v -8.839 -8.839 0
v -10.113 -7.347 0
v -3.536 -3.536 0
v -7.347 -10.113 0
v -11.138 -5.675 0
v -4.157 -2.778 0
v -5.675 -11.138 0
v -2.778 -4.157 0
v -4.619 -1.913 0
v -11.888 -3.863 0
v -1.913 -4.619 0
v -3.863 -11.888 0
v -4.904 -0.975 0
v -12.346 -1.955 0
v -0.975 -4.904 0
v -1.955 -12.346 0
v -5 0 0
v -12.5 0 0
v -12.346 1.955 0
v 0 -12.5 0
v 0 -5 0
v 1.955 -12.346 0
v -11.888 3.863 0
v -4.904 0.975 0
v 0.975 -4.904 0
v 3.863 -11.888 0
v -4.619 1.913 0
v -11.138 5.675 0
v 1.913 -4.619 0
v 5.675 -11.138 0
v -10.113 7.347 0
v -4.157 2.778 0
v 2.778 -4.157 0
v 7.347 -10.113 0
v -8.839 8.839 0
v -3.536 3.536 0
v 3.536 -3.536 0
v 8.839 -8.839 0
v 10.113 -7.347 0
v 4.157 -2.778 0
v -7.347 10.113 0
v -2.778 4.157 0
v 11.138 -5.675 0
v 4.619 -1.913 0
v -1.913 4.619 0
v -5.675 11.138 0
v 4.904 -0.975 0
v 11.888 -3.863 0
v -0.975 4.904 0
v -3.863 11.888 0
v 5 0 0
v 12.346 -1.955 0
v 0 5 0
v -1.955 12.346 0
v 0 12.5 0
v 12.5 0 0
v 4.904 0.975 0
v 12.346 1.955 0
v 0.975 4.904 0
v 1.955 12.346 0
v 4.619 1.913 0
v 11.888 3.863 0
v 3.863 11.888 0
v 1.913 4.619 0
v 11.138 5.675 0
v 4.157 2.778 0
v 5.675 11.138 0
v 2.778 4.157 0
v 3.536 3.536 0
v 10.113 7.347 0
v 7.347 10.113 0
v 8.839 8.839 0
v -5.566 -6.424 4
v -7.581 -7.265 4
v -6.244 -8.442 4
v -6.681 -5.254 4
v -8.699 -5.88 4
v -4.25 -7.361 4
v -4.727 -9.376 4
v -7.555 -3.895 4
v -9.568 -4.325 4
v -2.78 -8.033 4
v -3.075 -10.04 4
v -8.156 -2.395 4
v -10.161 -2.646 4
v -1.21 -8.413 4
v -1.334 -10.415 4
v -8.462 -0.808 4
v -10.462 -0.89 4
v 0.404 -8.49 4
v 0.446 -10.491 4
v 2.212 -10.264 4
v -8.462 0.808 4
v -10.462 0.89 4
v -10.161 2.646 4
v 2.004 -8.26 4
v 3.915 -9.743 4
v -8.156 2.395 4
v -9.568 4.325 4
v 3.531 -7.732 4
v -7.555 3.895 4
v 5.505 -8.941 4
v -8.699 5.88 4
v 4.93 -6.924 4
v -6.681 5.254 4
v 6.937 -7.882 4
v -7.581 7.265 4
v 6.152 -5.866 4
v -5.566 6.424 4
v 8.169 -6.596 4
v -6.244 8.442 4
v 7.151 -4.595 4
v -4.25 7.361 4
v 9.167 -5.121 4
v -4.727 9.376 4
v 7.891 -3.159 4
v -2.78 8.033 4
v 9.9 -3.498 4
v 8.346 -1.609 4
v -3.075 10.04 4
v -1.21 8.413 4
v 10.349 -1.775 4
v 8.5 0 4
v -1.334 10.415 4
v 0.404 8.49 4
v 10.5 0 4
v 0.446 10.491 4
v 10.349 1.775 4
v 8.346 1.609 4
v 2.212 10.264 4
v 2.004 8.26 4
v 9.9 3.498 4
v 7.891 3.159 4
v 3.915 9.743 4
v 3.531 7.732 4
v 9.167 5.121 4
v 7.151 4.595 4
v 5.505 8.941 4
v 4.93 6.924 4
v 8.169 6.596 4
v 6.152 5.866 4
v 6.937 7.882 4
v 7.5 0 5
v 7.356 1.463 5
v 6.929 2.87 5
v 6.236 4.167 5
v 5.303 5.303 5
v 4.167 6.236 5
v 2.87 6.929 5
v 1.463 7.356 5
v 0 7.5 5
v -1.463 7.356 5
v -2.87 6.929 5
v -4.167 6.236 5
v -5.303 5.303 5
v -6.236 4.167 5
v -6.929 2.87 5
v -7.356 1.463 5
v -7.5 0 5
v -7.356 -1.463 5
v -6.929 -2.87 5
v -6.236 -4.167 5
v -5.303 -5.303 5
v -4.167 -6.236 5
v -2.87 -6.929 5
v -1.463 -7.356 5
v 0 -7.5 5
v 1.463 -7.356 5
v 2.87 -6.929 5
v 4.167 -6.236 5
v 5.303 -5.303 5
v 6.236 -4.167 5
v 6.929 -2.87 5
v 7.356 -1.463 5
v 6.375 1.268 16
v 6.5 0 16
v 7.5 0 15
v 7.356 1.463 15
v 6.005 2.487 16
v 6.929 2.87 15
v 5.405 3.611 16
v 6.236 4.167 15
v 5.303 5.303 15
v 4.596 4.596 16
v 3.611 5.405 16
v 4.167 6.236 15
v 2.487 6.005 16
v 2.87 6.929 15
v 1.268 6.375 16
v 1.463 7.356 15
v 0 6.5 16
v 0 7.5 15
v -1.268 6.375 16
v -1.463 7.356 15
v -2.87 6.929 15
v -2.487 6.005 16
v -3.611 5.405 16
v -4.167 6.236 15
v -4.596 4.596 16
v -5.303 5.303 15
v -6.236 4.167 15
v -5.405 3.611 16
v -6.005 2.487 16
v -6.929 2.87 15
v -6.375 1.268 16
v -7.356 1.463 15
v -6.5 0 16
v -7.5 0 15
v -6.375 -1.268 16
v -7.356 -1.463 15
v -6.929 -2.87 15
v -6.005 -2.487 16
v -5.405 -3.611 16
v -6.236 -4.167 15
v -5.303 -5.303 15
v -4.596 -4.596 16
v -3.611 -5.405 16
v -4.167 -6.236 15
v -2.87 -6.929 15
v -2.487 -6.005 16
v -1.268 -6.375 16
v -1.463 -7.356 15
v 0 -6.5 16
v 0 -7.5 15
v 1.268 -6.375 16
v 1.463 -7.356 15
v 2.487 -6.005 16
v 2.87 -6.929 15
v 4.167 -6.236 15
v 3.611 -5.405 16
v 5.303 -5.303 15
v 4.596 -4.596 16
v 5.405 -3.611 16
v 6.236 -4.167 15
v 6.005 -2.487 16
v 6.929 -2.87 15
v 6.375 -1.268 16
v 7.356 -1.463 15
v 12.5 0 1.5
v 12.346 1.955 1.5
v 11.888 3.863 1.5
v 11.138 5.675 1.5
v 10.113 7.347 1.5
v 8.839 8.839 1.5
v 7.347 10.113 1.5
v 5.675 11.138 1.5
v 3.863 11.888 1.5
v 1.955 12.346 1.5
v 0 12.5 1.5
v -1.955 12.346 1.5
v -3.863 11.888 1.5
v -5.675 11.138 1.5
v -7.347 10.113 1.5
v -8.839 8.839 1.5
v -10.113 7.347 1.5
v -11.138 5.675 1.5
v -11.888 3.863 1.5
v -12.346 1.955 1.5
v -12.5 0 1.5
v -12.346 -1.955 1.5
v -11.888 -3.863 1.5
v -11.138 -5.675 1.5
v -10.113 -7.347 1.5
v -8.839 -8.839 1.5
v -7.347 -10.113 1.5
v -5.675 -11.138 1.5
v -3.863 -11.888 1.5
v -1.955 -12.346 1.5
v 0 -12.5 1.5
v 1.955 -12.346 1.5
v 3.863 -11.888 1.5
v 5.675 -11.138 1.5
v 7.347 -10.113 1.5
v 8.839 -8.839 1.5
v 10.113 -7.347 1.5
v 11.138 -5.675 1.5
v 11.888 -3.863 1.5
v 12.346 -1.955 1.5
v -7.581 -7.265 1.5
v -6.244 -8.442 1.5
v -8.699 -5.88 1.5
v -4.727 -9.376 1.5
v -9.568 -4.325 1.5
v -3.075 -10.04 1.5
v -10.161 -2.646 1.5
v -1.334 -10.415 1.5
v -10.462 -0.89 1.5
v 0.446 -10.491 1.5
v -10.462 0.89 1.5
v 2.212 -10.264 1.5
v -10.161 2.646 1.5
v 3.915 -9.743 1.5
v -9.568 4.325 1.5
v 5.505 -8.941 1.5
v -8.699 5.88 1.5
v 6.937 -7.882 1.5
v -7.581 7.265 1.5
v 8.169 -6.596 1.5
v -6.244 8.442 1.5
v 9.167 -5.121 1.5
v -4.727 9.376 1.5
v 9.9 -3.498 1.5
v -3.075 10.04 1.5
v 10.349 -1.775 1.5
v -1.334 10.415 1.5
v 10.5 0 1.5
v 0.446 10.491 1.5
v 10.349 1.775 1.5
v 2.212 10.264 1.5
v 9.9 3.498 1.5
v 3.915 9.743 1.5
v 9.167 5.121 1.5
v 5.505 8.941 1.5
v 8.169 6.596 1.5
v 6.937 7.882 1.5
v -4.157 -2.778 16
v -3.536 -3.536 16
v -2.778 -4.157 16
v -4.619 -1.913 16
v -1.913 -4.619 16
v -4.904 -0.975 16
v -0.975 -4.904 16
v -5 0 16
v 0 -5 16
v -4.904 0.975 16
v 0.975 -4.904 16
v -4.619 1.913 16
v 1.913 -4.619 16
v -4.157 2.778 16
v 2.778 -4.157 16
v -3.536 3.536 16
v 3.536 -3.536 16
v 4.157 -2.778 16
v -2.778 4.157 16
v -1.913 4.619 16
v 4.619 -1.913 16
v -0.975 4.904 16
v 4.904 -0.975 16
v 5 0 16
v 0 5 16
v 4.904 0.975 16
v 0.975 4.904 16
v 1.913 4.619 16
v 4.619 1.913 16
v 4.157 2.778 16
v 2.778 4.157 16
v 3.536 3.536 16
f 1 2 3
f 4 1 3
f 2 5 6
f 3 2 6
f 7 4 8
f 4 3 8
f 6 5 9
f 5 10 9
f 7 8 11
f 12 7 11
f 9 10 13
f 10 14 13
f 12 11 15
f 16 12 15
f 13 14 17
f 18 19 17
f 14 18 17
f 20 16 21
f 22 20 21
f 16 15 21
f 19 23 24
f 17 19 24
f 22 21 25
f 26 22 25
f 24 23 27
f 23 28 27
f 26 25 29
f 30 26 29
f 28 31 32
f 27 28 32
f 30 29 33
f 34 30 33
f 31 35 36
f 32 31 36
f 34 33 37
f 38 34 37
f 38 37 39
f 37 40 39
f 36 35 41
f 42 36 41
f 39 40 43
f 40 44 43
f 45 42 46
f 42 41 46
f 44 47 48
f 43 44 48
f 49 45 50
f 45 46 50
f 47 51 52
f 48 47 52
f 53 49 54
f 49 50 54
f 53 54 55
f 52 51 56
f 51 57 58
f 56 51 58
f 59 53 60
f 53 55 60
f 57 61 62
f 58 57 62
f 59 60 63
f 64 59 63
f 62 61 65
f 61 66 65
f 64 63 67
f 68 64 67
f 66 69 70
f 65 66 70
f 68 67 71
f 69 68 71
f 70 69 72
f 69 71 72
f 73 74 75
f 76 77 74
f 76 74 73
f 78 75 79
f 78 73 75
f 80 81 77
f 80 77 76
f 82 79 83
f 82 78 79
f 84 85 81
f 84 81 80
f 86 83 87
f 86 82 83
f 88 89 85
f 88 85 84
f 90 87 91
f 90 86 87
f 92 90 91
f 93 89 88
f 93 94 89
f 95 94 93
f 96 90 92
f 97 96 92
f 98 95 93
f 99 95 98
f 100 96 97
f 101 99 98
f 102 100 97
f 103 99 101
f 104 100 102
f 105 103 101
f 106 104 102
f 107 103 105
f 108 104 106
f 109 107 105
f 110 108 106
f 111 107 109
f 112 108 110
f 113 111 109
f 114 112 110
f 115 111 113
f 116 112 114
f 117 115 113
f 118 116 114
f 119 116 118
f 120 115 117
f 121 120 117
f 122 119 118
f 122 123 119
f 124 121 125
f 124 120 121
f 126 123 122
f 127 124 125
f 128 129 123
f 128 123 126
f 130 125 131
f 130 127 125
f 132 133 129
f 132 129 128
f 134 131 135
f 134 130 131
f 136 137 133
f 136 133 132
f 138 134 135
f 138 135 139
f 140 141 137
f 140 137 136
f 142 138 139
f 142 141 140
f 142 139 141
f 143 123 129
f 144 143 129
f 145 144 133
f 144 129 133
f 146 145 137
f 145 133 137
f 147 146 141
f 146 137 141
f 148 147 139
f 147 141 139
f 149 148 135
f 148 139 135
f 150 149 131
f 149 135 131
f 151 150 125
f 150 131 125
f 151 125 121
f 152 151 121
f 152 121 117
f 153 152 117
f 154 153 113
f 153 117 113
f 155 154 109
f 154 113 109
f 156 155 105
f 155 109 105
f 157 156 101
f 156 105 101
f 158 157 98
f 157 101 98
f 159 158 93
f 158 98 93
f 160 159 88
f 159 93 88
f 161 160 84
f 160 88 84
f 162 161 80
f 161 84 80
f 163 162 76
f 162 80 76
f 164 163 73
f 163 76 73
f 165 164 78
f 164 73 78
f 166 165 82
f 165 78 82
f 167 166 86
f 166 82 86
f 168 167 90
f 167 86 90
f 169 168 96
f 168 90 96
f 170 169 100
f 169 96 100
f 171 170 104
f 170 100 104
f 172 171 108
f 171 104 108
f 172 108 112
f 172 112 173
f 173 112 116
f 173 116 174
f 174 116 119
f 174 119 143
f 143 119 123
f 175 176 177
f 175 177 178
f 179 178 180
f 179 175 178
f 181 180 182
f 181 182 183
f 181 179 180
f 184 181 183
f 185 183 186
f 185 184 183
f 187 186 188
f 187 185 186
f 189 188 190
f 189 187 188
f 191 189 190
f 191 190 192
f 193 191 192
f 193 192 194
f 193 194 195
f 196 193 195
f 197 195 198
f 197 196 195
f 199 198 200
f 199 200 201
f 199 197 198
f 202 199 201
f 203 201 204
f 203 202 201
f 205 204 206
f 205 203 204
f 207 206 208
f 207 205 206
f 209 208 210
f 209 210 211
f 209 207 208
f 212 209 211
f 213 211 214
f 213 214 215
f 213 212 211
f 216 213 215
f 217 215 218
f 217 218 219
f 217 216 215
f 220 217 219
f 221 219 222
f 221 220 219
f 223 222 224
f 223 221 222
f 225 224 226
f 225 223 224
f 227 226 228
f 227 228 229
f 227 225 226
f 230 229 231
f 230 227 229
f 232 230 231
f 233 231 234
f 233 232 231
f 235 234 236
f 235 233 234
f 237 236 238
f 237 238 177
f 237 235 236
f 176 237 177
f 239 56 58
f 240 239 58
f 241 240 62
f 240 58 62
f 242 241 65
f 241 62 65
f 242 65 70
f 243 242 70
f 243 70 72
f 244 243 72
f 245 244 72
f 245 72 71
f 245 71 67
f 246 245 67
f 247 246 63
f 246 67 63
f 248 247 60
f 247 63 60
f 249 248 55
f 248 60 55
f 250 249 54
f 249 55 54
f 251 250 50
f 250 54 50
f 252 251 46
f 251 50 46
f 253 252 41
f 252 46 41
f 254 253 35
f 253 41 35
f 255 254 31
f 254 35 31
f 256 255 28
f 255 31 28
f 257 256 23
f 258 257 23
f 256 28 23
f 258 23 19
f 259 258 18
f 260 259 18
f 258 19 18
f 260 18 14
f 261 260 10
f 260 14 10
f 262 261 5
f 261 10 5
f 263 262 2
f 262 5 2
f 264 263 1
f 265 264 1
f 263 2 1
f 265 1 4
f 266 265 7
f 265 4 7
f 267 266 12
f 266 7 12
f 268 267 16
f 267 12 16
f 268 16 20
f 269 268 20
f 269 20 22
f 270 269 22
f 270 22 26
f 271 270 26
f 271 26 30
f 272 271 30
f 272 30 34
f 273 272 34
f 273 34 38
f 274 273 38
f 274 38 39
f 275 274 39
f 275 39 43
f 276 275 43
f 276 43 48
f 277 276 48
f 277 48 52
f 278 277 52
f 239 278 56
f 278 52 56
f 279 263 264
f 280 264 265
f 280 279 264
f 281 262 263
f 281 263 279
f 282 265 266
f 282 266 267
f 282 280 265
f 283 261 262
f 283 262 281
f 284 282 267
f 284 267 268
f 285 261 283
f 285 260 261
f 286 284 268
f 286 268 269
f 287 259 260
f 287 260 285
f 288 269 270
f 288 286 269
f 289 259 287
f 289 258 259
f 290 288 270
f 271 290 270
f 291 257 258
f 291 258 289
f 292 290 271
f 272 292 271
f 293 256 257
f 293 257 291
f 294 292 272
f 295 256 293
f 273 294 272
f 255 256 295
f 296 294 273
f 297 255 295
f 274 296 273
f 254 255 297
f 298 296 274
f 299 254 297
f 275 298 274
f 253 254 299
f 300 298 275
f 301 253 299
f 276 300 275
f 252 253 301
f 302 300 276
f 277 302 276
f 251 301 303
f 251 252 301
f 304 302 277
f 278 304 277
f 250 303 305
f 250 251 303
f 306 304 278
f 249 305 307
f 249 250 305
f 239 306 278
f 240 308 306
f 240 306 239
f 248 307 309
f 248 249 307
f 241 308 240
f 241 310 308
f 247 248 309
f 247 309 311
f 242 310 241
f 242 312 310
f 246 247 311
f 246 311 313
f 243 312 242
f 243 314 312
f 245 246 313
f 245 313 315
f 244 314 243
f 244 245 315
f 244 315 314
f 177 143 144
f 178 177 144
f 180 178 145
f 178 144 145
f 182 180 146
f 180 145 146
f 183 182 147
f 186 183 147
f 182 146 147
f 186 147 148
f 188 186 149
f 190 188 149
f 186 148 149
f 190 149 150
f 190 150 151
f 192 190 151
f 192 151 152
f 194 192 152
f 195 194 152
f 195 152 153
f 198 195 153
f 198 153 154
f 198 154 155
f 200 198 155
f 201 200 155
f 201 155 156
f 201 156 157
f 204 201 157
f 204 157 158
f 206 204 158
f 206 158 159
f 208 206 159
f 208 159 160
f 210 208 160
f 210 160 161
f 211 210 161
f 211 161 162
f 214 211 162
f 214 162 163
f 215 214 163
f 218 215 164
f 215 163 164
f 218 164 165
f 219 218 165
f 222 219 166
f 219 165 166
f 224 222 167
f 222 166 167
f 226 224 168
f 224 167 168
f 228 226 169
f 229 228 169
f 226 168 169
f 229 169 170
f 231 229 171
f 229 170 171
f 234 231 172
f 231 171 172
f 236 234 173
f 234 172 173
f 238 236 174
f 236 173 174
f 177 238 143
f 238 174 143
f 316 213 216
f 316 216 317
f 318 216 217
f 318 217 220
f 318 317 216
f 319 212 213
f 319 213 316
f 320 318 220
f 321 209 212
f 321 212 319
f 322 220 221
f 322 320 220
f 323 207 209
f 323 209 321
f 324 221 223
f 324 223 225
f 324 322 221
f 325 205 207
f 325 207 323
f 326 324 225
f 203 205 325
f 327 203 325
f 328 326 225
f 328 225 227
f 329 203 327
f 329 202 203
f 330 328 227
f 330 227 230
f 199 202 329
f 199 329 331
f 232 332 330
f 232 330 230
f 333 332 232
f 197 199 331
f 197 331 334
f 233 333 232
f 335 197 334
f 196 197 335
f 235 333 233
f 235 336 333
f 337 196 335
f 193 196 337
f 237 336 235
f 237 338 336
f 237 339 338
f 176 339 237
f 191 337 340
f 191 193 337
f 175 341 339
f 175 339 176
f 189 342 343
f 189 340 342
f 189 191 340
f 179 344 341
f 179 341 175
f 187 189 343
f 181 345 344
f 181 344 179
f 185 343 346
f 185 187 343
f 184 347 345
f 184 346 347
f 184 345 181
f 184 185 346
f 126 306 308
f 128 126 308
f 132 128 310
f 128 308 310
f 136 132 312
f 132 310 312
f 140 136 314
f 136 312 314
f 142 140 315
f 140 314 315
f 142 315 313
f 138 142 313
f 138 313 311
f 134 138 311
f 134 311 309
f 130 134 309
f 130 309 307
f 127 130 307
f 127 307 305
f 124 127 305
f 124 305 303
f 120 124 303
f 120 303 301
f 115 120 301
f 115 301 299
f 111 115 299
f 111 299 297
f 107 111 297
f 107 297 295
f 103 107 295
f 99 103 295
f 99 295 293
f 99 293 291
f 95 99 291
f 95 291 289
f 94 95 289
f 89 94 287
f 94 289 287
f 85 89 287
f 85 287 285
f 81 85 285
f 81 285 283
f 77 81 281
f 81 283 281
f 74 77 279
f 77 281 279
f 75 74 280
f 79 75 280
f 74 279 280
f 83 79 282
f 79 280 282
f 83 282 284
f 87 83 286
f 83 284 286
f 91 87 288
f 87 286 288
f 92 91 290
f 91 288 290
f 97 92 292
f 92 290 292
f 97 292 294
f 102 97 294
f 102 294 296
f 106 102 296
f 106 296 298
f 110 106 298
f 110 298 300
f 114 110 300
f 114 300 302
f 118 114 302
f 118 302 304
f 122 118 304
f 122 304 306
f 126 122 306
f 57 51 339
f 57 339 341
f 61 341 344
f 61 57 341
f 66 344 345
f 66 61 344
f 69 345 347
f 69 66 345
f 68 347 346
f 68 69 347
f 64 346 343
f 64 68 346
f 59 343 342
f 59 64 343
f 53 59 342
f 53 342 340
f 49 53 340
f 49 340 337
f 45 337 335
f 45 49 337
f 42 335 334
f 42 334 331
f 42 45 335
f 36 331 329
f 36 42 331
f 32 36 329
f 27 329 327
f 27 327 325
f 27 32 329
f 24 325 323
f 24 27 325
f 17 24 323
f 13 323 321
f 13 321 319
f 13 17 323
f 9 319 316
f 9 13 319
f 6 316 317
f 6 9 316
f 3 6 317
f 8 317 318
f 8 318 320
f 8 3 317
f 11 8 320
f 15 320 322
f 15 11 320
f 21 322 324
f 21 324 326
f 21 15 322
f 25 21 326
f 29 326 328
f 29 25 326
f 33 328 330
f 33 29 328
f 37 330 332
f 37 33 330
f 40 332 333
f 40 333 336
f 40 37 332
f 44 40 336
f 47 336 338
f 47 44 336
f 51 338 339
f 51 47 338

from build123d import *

# Parameters (mm, degrees)
F0_R     = 7.5
F0_R_2   = 5
F0_R_3   = 12.5
F0_R_4   = 10.5
F1_DEPTH = 1.5
F2_DEPTH = 4
F3_DEPTH = 16
F4_SIZE  = 1


with BuildPart() as f1:
    # F0 (on Top) → F1 (new body)
    with BuildSketch(Plane.XY):
        Circle(F0_R)
        Circle(F0_R_2, mode=Mode.SUBTRACT)
        Circle(F0_R_3)
        Circle(F0_R_4, mode=Mode.SUBTRACT)
        Circle(F0_R_4)
        Circle(F0_R, mode=Mode.SUBTRACT)
    extrude(amount=F1_DEPTH)

    # F0 (on Top) → F2 (join)
    with BuildSketch(Plane.XY):
        Circle(F0_R)
        Circle(F0_R_2, mode=Mode.SUBTRACT)
        Circle(F0_R_4)
        Circle(F0_R, mode=Mode.SUBTRACT)
    extrude(amount=F2_DEPTH)

    # F0 (on Top) → F3 (join)
    with BuildSketch(Plane.XY):
        Circle(F0_R)
        Circle(F0_R_2, mode=Mode.SUBTRACT)
    extrude(amount=F3_DEPTH)

    # F4
    f4_edges = [f1.edges().sort_by_distance(p)[0] for p in [
        (-7.5, 0, 16),
        (-7.5, 0, 4),
    ]]
    chamfer(f4_edges, length=F4_SIZE)


solid = f1.part
